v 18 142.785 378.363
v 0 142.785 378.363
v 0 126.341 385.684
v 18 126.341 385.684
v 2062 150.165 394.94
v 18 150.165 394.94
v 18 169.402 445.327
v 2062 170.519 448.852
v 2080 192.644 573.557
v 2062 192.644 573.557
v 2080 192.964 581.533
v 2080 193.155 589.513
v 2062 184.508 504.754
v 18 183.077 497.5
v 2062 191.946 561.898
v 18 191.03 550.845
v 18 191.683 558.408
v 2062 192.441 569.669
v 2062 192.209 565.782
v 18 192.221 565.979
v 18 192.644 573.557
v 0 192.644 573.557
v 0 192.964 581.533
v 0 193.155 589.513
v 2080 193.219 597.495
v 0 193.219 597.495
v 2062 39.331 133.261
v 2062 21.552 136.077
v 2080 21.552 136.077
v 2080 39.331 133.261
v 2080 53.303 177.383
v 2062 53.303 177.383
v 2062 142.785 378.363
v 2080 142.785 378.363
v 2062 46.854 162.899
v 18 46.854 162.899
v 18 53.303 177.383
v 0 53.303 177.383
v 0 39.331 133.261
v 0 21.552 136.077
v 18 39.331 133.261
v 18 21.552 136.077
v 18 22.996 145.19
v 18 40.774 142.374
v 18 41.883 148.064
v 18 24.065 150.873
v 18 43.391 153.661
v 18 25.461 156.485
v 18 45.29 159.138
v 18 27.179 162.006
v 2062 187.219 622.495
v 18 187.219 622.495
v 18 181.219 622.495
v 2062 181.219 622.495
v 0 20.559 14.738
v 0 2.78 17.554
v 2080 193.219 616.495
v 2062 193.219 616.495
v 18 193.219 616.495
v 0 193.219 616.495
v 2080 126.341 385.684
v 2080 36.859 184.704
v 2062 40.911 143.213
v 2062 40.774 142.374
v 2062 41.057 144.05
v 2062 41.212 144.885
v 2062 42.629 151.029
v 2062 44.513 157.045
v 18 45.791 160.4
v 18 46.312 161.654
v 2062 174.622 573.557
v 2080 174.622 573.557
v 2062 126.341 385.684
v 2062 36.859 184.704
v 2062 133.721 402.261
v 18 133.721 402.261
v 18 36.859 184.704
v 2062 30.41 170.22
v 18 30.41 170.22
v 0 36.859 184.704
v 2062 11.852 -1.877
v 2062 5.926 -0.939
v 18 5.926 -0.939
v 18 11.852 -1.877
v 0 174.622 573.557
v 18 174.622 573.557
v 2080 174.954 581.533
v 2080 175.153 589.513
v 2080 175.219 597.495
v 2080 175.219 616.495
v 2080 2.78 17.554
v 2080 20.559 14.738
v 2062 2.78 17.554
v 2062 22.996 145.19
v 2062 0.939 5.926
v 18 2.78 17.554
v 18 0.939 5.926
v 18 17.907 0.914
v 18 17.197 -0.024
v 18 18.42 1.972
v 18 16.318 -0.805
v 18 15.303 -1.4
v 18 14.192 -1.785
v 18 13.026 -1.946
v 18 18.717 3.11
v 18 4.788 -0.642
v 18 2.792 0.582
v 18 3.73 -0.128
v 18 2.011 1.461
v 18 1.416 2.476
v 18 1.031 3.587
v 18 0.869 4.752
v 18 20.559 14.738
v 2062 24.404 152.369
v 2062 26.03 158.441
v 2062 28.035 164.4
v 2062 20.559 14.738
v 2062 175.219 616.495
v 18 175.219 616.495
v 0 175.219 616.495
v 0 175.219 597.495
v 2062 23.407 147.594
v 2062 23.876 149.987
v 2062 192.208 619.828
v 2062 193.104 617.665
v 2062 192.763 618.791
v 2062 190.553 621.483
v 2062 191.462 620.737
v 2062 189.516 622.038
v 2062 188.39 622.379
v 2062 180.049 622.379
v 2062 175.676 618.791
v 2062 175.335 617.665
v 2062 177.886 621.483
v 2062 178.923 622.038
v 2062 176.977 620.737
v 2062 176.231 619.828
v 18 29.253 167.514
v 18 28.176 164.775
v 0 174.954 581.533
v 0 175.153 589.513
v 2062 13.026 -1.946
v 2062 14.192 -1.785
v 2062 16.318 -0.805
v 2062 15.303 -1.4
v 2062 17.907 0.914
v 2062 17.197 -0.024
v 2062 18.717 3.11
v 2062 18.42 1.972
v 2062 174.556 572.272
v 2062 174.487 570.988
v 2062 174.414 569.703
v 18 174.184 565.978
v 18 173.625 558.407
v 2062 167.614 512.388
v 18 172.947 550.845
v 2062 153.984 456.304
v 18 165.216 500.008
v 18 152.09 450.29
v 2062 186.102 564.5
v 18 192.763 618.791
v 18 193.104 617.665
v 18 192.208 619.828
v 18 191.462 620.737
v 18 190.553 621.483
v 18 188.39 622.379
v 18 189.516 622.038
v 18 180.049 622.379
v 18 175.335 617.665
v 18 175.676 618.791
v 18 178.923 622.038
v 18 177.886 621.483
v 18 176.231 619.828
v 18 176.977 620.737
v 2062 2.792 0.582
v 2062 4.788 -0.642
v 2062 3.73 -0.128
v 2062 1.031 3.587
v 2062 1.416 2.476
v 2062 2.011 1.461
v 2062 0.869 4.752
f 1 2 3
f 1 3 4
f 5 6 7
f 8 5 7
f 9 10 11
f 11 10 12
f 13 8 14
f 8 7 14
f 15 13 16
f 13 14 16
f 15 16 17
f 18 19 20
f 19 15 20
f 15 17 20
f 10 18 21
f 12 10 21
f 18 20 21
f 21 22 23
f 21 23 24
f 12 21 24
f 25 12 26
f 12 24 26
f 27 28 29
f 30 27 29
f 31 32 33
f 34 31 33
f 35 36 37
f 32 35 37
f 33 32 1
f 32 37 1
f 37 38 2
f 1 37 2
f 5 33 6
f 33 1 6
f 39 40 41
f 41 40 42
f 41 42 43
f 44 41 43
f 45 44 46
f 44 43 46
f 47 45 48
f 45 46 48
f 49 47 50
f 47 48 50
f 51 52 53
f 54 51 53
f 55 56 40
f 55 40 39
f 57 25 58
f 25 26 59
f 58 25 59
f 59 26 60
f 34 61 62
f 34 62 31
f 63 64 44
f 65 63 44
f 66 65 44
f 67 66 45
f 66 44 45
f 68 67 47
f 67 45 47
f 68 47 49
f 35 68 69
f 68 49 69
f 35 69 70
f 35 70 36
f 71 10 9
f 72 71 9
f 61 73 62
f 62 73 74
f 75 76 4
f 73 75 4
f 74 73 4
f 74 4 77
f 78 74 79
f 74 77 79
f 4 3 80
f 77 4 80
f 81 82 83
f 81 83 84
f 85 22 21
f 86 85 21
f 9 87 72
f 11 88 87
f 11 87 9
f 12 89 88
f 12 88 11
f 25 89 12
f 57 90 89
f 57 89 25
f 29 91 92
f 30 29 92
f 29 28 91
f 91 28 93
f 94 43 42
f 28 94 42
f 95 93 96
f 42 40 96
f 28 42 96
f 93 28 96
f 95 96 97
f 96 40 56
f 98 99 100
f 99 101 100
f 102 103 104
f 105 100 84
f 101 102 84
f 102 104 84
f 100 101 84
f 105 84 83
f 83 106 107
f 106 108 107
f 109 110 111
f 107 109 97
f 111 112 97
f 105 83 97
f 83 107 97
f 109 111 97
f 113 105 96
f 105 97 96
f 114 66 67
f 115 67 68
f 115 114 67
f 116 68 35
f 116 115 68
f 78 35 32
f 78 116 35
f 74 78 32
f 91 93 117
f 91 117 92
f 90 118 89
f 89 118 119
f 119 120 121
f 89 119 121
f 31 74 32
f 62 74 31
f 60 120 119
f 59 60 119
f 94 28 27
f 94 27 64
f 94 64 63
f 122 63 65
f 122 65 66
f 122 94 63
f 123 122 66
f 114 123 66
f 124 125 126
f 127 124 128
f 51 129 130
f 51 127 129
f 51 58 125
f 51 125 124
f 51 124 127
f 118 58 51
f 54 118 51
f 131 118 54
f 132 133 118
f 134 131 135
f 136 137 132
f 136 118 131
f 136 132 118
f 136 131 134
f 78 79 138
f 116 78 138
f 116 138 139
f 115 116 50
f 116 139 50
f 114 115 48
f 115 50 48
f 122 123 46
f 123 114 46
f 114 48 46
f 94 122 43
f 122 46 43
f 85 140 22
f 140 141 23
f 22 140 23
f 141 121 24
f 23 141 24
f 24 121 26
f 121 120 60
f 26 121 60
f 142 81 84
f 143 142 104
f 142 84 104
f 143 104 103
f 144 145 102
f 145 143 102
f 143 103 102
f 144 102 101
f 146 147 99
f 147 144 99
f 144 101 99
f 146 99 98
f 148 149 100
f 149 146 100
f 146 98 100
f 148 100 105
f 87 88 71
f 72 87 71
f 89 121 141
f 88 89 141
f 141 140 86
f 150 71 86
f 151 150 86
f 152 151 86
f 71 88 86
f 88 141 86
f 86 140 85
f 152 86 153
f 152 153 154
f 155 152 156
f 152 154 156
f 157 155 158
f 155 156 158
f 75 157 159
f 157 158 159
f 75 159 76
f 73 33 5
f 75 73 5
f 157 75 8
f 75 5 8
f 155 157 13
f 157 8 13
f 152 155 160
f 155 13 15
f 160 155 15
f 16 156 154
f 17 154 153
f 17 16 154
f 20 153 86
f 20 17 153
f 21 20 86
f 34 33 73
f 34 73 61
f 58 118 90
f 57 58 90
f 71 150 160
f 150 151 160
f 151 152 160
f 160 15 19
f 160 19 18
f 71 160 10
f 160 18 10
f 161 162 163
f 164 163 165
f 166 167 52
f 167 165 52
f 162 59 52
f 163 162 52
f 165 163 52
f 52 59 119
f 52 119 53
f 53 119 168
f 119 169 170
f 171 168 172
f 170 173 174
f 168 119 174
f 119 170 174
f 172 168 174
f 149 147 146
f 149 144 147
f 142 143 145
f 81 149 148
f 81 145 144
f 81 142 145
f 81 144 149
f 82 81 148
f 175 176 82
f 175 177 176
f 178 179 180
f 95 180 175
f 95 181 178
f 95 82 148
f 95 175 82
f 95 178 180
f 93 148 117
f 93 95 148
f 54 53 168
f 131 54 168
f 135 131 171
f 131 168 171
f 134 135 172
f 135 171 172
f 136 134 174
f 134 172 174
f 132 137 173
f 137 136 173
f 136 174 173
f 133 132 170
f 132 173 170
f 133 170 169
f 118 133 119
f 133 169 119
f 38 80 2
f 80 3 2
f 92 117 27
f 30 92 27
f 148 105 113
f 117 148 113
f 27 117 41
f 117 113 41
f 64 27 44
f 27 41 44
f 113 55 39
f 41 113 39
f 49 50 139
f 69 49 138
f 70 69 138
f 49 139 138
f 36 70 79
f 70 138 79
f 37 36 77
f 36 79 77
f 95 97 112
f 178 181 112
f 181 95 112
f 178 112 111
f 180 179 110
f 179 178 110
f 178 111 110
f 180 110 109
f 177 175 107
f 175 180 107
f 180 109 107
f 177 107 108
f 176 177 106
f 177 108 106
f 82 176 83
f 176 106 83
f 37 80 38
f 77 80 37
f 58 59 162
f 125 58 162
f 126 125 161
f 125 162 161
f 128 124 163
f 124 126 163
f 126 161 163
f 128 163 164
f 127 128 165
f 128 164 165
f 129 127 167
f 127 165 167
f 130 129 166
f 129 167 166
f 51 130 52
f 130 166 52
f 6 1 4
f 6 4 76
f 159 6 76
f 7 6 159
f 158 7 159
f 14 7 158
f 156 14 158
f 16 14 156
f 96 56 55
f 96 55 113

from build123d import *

# Parameters (mm, degrees)
F1_DEPTH      = 2080
F2_W          = 32.756647
F2_H          = 43.48932
F2_H_2        = 26.490313
F3_DEPTH      = 25
F4_W          = 44.810192
F4_H          = 34.606159
F4_H_2        = 187.662824
F5_DEPTH      = 88.72009
F5_DEPTH_BACK = 90.01171
F6_W          = 27.187791
F6_H          = 22.711933
F6_H_2        = 20.19423
F7_DEPTH      = 25
F8_DEPTH      = 29.81951


with BuildPart() as f1:
    # F0 (on Right) → F1 (new body)
    with BuildSketch(Plane.YZ):
        with BuildLine():
            Line((22.995866, 145.190186), (0.938607, 5.92613))
            ThreePointArc((0.938607, 5.92613), (2.010635, 1.460812), (5.92613, -0.938607))
            Line((5.92613, -0.938607), (11.85226, -1.877214))
            ThreePointArc((11.85226, -1.877214), (16.317578, -0.805186), (18.716997, 3.11031))
            Line((18.716997, 3.11031), (40.774256, 142.374366))
            ThreePointArc((40.774256, 142.374366), (43.141482, 152.835998), (46.853973, 162.899144))
            Line((46.853973, 162.899144), (150.16508, 394.939691))
            ThreePointArc((150.16508, 394.939691), (182.336947, 493.954517), (193.219442, 597.494539))
            Line((193.219442, 597.494539), (193.219442, 616.494539))
            ThreePointArc((193.219442, 616.494539), (191.462083, 620.737179), (187.219442, 622.494539))
            Line((187.219442, 622.494539), (181.219442, 622.494539))
            ThreePointArc((181.219442, 622.494539), (176.976802, 620.737179), (175.219442, 616.494539))
            Line((175.219442, 616.494539), (175.219442, 597.494539))
            ThreePointArc((175.219442, 597.494539), (164.730291, 497.696927), (133.721262, 402.26095))
            Line((133.721262, 402.26095), (30.410155, 170.220404))
            ThreePointArc((30.410155, 170.220404), (25.882727, 157.948274), (22.995866, 145.190186))
        make_face()
    extrude(amount=F1_DEPTH)

    # F2 (on face) → F3 (cut)
    with BuildSketch(Plane(origin=(0, 0, 0), x_dir=(1, 0, 0), z_dir=(0, -0.987688, 0.156434))):
        with Locations((1.621677, -3.971665)):
            Rectangle(F2_W, F2_H)
        with Locations((1.621677, 151.018151)):
            Rectangle(F2_W, F2_H_2)
        with Locations((2078.378324, 151.018151)):
            Rectangle(F2_W, F2_H_2)
        with Locations((2078.378324, -3.971665)):
            Rectangle(F2_W, F2_H)
    extrude(amount=-F3_DEPTH, mode=Mode.SUBTRACT)

    # F4 (on face) → F5 (cut, two sides)
    with BuildSketch(Plane(origin=(0, -37.869946, 16.860786), x_dir=(1, 0, 0), z_dir=(0, -0.913545, 0.406737))) as f5_sk:
        with Locations((-4.405096, 166.424588)):
            Rectangle(F4_W, F4_H)
        with Locations((-4.405096, 497.559079)):
            Rectangle(F4_W, F4_H_2)
        with Locations((2084.405096, 497.559079)):
            Rectangle(F4_W, F4_H_2)
        with Locations((2084.405096, 166.424588)):
            Rectangle(F4_W, F4_H)
    extrude(amount=F5_DEPTH, mode=Mode.SUBTRACT)
    extrude(f5_sk.sketch, amount=-F5_DEPTH_BACK, mode=Mode.SUBTRACT)

    # F6 (on face) → F7 (cut)
    with BuildSketch(Plane.XZ.offset(-175.219442)):
        with Locations((4.406105, 562.20141)):
            Rectangle(F6_W, F6_H)
        with Locations((4.406105, 626.591654)):
            Rectangle(F6_W, F6_H_2)
        with Locations((2075.593896, 562.20141)):
            Rectangle(F6_W, F6_H)
        with Locations((2075.593896, 626.591654)):
            Rectangle(F6_W, F6_H_2)
    extrude(amount=-F7_DEPTH, mode=Mode.SUBTRACT)

    # F6 (on face) → F8 (cut)
    with BuildSketch(Plane.XZ.offset(-175.219442)):
        with Locations((4.406105, 562.20141)):
            Rectangle(F6_W, F6_H)
        with Locations((4.406105, 626.591654)):
            Rectangle(F6_W, F6_H_2)
        with Locations((2075.593896, 562.20141)):
            Rectangle(F6_W, F6_H)
        with Locations((2075.593896, 626.591654)):
            Rectangle(F6_W, F6_H_2)
    extrude(amount=F8_DEPTH, mode=Mode.SUBTRACT)


solid = f1.part
